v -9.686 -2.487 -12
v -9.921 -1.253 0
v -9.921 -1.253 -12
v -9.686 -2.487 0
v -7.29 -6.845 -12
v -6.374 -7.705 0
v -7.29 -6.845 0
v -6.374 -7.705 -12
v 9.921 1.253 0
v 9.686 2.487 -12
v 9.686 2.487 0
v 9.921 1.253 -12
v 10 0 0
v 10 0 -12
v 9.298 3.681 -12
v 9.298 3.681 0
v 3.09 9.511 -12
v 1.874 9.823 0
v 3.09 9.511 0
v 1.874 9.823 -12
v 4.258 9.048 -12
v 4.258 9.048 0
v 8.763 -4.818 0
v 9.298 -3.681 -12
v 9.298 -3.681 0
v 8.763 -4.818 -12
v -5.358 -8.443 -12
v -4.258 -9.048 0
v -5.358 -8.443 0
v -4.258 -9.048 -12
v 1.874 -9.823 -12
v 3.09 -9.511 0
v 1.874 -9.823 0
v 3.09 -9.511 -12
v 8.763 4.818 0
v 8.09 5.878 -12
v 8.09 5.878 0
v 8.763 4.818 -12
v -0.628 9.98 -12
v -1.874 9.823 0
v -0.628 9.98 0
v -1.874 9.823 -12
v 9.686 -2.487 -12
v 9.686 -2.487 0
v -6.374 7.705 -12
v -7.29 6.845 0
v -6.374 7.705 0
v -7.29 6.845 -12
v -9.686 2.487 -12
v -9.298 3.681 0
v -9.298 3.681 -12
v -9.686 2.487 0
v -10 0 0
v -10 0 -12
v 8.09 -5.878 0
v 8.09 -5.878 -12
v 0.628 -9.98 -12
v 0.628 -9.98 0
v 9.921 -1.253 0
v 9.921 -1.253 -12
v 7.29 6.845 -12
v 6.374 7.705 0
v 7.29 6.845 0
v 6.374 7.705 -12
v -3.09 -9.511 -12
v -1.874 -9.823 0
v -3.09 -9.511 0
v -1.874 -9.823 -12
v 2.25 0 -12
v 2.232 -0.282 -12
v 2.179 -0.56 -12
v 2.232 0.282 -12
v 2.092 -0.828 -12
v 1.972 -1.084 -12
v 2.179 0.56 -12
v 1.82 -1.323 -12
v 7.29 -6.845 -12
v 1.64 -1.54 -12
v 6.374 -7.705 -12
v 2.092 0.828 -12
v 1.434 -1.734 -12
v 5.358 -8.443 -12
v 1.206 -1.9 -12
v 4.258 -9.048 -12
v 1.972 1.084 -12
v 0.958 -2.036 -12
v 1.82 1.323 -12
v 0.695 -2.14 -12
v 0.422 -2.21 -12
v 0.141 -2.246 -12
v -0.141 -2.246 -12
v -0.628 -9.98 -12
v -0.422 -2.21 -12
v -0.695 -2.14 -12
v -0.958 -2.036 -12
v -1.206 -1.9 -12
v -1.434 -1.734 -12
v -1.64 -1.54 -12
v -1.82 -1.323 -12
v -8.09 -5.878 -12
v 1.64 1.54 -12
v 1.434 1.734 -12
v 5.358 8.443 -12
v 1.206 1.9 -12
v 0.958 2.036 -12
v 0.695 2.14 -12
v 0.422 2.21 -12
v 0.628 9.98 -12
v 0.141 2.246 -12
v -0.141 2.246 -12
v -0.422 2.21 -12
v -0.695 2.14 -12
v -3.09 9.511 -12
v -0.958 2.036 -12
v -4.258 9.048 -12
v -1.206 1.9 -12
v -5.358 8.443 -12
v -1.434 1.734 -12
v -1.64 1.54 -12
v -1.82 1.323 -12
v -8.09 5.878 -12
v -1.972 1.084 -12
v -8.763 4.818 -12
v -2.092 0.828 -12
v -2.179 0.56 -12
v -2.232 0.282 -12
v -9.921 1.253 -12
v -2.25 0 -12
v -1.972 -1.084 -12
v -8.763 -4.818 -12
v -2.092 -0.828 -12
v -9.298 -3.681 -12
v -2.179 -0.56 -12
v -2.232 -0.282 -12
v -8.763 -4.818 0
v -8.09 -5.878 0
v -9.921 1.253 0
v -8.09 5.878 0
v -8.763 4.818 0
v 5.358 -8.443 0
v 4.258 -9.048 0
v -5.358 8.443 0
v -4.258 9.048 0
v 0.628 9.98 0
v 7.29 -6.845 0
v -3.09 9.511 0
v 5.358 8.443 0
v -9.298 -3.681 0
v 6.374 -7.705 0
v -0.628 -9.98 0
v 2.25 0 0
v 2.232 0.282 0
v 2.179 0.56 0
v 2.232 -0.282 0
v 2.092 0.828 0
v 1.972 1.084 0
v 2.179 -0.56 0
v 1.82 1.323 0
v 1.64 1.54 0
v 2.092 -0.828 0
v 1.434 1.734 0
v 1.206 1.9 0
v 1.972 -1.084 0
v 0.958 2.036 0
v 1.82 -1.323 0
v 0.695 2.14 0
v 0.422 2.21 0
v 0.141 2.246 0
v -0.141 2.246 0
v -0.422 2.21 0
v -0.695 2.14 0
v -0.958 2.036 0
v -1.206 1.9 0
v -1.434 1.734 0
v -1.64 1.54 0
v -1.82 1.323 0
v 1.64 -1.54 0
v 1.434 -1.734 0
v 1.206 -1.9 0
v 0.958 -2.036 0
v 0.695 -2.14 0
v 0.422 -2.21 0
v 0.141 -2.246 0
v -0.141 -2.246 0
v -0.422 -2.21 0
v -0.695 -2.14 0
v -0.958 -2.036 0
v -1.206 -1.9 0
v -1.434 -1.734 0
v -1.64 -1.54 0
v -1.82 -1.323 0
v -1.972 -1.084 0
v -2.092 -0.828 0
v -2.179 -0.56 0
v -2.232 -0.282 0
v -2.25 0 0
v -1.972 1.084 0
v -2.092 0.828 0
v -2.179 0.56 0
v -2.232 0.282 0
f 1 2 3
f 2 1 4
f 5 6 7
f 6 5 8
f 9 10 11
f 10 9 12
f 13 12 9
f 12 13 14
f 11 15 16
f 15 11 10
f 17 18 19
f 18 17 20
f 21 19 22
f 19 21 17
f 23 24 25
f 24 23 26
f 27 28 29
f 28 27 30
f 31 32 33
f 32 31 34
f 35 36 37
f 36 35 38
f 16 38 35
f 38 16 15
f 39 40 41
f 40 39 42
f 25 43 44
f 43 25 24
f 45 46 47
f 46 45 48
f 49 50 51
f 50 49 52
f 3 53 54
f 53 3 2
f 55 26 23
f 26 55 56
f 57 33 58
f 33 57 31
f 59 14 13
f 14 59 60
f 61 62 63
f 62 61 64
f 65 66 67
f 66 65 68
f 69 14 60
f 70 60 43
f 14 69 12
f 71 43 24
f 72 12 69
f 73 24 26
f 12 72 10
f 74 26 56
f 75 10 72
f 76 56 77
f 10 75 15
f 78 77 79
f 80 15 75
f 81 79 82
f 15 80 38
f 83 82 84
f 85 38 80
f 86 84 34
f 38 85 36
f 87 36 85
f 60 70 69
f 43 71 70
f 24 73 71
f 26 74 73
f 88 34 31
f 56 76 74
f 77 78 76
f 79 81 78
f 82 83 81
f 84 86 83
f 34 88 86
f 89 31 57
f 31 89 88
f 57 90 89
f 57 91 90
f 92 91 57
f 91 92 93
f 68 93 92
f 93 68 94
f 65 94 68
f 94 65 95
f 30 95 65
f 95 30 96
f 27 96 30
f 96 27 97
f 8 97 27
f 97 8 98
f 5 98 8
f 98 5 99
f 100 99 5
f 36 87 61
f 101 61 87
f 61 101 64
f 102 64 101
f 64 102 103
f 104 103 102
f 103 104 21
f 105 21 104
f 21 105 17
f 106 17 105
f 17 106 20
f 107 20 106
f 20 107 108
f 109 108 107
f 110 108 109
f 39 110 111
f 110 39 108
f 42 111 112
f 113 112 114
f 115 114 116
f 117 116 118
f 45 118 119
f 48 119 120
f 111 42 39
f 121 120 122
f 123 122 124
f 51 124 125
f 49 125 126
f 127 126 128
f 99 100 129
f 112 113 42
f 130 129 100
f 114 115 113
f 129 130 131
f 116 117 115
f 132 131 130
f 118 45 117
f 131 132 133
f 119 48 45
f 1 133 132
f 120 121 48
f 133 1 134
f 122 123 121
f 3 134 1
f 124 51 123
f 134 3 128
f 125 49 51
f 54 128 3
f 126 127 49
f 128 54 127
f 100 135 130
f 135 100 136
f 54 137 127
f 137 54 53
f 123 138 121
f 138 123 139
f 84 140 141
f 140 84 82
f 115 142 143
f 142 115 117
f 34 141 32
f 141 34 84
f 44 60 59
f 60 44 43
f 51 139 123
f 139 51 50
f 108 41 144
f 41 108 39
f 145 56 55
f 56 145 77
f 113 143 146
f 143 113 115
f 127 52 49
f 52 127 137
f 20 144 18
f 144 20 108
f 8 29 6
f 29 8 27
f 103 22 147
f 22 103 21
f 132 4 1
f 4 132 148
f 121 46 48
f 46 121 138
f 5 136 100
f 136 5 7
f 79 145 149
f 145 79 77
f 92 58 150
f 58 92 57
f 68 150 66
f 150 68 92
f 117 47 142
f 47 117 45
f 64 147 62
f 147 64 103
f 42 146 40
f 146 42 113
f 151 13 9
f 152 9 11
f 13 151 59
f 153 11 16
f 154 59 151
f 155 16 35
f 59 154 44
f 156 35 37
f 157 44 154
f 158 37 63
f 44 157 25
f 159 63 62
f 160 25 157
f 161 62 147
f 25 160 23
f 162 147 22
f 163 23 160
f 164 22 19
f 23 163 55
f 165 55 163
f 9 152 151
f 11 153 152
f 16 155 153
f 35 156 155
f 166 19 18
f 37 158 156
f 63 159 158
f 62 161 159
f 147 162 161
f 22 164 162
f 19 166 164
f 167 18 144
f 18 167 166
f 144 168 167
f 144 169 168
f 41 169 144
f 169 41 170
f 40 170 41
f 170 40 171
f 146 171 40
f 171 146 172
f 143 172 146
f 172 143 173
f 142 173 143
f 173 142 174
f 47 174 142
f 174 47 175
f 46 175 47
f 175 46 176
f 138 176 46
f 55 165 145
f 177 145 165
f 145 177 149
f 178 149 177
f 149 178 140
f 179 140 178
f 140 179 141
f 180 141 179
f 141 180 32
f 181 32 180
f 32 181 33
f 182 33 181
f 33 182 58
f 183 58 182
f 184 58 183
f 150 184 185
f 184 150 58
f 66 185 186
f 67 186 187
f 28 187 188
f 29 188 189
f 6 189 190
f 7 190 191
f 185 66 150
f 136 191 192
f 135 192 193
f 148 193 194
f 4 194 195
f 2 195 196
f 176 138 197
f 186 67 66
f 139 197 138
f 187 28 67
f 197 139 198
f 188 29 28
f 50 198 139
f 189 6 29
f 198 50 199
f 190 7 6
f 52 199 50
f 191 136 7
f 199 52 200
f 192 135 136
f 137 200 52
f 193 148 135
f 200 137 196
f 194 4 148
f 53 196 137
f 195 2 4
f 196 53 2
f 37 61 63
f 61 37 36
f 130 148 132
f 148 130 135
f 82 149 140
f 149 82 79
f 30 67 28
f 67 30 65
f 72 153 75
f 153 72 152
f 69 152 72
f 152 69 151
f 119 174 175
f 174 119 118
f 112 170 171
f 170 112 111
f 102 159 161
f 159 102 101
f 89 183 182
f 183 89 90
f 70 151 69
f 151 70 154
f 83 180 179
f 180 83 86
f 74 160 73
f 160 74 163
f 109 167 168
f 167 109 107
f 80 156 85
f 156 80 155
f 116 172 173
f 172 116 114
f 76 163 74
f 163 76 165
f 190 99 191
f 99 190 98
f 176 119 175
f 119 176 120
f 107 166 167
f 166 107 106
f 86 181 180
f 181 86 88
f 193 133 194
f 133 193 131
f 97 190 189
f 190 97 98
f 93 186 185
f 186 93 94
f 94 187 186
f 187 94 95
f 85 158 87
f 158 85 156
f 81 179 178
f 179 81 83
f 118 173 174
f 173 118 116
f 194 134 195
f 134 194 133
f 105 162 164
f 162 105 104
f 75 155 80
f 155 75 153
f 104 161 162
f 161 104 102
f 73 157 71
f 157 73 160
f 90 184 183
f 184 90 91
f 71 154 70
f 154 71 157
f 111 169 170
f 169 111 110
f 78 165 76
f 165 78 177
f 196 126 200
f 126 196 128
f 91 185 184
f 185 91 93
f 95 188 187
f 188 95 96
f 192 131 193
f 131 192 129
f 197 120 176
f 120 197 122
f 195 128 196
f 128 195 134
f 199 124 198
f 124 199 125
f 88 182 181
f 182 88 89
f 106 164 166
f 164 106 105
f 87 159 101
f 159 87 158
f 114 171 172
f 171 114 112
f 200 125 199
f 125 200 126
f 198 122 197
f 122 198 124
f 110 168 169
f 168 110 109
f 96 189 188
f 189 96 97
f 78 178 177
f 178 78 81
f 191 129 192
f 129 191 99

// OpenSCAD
$fn = 50;


difference() {
	union() {
		translate(v = [0, 0, -12.0000000000]) {
			cylinder(h = 12, r = 10.0000000000);
		}
		cylinder(h = 0, r = 20.0000000000);
	}
	union() {
		#translate(v = [0, 0, -12]) {
			cylinder(h = 12, r = 2.2500000000);
		}
	}
}
